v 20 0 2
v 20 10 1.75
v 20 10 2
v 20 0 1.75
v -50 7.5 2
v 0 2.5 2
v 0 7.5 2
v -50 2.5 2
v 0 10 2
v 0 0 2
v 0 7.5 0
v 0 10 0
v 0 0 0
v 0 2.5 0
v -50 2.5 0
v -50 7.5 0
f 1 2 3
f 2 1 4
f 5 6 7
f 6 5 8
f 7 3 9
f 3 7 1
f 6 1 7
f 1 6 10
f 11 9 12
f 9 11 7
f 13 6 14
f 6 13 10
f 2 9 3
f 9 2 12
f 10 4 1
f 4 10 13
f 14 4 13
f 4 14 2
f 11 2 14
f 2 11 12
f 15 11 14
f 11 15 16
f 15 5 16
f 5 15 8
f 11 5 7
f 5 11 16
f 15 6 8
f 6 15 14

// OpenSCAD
//!OpenSCAD

part = "spatular";//[Mixing bowl,Spatular]
/*[Mixing bowl]*/
length2 = 20;
width = 20;
height = 5;
/*[spatular]*/
spatular_length = 20;
spatular_width = 10;
grabber_length = 50;
spatular_height = 2;
//defines the angle of the top part of the spatular
angle = 355;
if (part == "Mixing bowl") {
  difference() {
    translate([0, 0, -0.5]){
      cube([(length2 + 1), (width + 1), (height + 1)], center=true);
    }

    cube([length2, width, height], center=true);
  }
} else {
  union(){
    difference() {
      cube([spatular_length, spatular_width, spatular_height], center=false);

      rotate([0, angle, 0]){
        translate([0, 0, (spatular_height * -1)]){
          cube([(spatular_length + 20), spatular_width, spatular_height], center=false);
        }
      }
    }
    translate([(grabber_length * -1), (spatular_width / 4), 0]){
      cube([grabber_length, 5, spatular_height], center=false);
    }
  }
}
